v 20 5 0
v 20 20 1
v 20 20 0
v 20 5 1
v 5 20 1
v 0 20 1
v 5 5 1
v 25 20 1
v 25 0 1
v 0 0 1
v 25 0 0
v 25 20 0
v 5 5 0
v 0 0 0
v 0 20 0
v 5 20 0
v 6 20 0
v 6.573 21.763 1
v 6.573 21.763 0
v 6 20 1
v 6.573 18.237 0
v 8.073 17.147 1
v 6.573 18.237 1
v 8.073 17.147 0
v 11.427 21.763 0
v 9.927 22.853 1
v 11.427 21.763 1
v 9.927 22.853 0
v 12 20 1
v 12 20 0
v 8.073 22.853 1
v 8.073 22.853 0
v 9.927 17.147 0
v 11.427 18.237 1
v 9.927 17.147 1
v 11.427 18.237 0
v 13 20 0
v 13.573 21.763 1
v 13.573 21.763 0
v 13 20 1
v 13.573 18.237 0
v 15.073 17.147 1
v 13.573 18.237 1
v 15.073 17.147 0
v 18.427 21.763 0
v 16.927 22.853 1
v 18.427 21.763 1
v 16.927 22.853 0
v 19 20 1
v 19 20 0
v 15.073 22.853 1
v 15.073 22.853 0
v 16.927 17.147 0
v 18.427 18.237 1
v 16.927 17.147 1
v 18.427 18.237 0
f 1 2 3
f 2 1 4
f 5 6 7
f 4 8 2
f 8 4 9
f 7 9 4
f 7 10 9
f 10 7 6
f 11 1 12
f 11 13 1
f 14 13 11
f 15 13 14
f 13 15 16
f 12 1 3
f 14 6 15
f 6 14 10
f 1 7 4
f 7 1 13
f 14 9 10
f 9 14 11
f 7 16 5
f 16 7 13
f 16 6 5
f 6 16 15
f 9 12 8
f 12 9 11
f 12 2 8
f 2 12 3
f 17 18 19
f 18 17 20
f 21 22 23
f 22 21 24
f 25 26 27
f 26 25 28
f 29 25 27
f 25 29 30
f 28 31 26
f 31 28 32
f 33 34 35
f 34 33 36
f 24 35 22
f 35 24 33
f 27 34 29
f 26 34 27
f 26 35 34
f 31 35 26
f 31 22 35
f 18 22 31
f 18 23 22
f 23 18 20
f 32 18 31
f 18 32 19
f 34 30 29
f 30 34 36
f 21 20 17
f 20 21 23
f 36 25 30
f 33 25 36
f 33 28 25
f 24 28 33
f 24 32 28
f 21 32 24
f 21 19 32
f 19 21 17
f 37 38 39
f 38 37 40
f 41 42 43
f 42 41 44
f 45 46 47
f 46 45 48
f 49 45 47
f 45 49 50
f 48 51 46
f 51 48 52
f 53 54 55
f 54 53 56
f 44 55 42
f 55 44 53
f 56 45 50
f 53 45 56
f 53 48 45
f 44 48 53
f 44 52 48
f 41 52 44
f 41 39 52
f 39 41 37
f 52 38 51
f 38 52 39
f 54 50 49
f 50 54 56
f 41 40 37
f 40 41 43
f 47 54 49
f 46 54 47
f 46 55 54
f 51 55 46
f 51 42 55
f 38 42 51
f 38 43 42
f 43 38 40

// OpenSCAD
module combing_evasion()
{
    cube([20,5,1]);
    cube([5,20,1]);
    translate([20,0]) cube([5,20,1]);
    translate([9,20]) cylinder(h=1, r=3);
    translate([16,20]) cylinder(h=1, r=3);
}

combing_evasion();
